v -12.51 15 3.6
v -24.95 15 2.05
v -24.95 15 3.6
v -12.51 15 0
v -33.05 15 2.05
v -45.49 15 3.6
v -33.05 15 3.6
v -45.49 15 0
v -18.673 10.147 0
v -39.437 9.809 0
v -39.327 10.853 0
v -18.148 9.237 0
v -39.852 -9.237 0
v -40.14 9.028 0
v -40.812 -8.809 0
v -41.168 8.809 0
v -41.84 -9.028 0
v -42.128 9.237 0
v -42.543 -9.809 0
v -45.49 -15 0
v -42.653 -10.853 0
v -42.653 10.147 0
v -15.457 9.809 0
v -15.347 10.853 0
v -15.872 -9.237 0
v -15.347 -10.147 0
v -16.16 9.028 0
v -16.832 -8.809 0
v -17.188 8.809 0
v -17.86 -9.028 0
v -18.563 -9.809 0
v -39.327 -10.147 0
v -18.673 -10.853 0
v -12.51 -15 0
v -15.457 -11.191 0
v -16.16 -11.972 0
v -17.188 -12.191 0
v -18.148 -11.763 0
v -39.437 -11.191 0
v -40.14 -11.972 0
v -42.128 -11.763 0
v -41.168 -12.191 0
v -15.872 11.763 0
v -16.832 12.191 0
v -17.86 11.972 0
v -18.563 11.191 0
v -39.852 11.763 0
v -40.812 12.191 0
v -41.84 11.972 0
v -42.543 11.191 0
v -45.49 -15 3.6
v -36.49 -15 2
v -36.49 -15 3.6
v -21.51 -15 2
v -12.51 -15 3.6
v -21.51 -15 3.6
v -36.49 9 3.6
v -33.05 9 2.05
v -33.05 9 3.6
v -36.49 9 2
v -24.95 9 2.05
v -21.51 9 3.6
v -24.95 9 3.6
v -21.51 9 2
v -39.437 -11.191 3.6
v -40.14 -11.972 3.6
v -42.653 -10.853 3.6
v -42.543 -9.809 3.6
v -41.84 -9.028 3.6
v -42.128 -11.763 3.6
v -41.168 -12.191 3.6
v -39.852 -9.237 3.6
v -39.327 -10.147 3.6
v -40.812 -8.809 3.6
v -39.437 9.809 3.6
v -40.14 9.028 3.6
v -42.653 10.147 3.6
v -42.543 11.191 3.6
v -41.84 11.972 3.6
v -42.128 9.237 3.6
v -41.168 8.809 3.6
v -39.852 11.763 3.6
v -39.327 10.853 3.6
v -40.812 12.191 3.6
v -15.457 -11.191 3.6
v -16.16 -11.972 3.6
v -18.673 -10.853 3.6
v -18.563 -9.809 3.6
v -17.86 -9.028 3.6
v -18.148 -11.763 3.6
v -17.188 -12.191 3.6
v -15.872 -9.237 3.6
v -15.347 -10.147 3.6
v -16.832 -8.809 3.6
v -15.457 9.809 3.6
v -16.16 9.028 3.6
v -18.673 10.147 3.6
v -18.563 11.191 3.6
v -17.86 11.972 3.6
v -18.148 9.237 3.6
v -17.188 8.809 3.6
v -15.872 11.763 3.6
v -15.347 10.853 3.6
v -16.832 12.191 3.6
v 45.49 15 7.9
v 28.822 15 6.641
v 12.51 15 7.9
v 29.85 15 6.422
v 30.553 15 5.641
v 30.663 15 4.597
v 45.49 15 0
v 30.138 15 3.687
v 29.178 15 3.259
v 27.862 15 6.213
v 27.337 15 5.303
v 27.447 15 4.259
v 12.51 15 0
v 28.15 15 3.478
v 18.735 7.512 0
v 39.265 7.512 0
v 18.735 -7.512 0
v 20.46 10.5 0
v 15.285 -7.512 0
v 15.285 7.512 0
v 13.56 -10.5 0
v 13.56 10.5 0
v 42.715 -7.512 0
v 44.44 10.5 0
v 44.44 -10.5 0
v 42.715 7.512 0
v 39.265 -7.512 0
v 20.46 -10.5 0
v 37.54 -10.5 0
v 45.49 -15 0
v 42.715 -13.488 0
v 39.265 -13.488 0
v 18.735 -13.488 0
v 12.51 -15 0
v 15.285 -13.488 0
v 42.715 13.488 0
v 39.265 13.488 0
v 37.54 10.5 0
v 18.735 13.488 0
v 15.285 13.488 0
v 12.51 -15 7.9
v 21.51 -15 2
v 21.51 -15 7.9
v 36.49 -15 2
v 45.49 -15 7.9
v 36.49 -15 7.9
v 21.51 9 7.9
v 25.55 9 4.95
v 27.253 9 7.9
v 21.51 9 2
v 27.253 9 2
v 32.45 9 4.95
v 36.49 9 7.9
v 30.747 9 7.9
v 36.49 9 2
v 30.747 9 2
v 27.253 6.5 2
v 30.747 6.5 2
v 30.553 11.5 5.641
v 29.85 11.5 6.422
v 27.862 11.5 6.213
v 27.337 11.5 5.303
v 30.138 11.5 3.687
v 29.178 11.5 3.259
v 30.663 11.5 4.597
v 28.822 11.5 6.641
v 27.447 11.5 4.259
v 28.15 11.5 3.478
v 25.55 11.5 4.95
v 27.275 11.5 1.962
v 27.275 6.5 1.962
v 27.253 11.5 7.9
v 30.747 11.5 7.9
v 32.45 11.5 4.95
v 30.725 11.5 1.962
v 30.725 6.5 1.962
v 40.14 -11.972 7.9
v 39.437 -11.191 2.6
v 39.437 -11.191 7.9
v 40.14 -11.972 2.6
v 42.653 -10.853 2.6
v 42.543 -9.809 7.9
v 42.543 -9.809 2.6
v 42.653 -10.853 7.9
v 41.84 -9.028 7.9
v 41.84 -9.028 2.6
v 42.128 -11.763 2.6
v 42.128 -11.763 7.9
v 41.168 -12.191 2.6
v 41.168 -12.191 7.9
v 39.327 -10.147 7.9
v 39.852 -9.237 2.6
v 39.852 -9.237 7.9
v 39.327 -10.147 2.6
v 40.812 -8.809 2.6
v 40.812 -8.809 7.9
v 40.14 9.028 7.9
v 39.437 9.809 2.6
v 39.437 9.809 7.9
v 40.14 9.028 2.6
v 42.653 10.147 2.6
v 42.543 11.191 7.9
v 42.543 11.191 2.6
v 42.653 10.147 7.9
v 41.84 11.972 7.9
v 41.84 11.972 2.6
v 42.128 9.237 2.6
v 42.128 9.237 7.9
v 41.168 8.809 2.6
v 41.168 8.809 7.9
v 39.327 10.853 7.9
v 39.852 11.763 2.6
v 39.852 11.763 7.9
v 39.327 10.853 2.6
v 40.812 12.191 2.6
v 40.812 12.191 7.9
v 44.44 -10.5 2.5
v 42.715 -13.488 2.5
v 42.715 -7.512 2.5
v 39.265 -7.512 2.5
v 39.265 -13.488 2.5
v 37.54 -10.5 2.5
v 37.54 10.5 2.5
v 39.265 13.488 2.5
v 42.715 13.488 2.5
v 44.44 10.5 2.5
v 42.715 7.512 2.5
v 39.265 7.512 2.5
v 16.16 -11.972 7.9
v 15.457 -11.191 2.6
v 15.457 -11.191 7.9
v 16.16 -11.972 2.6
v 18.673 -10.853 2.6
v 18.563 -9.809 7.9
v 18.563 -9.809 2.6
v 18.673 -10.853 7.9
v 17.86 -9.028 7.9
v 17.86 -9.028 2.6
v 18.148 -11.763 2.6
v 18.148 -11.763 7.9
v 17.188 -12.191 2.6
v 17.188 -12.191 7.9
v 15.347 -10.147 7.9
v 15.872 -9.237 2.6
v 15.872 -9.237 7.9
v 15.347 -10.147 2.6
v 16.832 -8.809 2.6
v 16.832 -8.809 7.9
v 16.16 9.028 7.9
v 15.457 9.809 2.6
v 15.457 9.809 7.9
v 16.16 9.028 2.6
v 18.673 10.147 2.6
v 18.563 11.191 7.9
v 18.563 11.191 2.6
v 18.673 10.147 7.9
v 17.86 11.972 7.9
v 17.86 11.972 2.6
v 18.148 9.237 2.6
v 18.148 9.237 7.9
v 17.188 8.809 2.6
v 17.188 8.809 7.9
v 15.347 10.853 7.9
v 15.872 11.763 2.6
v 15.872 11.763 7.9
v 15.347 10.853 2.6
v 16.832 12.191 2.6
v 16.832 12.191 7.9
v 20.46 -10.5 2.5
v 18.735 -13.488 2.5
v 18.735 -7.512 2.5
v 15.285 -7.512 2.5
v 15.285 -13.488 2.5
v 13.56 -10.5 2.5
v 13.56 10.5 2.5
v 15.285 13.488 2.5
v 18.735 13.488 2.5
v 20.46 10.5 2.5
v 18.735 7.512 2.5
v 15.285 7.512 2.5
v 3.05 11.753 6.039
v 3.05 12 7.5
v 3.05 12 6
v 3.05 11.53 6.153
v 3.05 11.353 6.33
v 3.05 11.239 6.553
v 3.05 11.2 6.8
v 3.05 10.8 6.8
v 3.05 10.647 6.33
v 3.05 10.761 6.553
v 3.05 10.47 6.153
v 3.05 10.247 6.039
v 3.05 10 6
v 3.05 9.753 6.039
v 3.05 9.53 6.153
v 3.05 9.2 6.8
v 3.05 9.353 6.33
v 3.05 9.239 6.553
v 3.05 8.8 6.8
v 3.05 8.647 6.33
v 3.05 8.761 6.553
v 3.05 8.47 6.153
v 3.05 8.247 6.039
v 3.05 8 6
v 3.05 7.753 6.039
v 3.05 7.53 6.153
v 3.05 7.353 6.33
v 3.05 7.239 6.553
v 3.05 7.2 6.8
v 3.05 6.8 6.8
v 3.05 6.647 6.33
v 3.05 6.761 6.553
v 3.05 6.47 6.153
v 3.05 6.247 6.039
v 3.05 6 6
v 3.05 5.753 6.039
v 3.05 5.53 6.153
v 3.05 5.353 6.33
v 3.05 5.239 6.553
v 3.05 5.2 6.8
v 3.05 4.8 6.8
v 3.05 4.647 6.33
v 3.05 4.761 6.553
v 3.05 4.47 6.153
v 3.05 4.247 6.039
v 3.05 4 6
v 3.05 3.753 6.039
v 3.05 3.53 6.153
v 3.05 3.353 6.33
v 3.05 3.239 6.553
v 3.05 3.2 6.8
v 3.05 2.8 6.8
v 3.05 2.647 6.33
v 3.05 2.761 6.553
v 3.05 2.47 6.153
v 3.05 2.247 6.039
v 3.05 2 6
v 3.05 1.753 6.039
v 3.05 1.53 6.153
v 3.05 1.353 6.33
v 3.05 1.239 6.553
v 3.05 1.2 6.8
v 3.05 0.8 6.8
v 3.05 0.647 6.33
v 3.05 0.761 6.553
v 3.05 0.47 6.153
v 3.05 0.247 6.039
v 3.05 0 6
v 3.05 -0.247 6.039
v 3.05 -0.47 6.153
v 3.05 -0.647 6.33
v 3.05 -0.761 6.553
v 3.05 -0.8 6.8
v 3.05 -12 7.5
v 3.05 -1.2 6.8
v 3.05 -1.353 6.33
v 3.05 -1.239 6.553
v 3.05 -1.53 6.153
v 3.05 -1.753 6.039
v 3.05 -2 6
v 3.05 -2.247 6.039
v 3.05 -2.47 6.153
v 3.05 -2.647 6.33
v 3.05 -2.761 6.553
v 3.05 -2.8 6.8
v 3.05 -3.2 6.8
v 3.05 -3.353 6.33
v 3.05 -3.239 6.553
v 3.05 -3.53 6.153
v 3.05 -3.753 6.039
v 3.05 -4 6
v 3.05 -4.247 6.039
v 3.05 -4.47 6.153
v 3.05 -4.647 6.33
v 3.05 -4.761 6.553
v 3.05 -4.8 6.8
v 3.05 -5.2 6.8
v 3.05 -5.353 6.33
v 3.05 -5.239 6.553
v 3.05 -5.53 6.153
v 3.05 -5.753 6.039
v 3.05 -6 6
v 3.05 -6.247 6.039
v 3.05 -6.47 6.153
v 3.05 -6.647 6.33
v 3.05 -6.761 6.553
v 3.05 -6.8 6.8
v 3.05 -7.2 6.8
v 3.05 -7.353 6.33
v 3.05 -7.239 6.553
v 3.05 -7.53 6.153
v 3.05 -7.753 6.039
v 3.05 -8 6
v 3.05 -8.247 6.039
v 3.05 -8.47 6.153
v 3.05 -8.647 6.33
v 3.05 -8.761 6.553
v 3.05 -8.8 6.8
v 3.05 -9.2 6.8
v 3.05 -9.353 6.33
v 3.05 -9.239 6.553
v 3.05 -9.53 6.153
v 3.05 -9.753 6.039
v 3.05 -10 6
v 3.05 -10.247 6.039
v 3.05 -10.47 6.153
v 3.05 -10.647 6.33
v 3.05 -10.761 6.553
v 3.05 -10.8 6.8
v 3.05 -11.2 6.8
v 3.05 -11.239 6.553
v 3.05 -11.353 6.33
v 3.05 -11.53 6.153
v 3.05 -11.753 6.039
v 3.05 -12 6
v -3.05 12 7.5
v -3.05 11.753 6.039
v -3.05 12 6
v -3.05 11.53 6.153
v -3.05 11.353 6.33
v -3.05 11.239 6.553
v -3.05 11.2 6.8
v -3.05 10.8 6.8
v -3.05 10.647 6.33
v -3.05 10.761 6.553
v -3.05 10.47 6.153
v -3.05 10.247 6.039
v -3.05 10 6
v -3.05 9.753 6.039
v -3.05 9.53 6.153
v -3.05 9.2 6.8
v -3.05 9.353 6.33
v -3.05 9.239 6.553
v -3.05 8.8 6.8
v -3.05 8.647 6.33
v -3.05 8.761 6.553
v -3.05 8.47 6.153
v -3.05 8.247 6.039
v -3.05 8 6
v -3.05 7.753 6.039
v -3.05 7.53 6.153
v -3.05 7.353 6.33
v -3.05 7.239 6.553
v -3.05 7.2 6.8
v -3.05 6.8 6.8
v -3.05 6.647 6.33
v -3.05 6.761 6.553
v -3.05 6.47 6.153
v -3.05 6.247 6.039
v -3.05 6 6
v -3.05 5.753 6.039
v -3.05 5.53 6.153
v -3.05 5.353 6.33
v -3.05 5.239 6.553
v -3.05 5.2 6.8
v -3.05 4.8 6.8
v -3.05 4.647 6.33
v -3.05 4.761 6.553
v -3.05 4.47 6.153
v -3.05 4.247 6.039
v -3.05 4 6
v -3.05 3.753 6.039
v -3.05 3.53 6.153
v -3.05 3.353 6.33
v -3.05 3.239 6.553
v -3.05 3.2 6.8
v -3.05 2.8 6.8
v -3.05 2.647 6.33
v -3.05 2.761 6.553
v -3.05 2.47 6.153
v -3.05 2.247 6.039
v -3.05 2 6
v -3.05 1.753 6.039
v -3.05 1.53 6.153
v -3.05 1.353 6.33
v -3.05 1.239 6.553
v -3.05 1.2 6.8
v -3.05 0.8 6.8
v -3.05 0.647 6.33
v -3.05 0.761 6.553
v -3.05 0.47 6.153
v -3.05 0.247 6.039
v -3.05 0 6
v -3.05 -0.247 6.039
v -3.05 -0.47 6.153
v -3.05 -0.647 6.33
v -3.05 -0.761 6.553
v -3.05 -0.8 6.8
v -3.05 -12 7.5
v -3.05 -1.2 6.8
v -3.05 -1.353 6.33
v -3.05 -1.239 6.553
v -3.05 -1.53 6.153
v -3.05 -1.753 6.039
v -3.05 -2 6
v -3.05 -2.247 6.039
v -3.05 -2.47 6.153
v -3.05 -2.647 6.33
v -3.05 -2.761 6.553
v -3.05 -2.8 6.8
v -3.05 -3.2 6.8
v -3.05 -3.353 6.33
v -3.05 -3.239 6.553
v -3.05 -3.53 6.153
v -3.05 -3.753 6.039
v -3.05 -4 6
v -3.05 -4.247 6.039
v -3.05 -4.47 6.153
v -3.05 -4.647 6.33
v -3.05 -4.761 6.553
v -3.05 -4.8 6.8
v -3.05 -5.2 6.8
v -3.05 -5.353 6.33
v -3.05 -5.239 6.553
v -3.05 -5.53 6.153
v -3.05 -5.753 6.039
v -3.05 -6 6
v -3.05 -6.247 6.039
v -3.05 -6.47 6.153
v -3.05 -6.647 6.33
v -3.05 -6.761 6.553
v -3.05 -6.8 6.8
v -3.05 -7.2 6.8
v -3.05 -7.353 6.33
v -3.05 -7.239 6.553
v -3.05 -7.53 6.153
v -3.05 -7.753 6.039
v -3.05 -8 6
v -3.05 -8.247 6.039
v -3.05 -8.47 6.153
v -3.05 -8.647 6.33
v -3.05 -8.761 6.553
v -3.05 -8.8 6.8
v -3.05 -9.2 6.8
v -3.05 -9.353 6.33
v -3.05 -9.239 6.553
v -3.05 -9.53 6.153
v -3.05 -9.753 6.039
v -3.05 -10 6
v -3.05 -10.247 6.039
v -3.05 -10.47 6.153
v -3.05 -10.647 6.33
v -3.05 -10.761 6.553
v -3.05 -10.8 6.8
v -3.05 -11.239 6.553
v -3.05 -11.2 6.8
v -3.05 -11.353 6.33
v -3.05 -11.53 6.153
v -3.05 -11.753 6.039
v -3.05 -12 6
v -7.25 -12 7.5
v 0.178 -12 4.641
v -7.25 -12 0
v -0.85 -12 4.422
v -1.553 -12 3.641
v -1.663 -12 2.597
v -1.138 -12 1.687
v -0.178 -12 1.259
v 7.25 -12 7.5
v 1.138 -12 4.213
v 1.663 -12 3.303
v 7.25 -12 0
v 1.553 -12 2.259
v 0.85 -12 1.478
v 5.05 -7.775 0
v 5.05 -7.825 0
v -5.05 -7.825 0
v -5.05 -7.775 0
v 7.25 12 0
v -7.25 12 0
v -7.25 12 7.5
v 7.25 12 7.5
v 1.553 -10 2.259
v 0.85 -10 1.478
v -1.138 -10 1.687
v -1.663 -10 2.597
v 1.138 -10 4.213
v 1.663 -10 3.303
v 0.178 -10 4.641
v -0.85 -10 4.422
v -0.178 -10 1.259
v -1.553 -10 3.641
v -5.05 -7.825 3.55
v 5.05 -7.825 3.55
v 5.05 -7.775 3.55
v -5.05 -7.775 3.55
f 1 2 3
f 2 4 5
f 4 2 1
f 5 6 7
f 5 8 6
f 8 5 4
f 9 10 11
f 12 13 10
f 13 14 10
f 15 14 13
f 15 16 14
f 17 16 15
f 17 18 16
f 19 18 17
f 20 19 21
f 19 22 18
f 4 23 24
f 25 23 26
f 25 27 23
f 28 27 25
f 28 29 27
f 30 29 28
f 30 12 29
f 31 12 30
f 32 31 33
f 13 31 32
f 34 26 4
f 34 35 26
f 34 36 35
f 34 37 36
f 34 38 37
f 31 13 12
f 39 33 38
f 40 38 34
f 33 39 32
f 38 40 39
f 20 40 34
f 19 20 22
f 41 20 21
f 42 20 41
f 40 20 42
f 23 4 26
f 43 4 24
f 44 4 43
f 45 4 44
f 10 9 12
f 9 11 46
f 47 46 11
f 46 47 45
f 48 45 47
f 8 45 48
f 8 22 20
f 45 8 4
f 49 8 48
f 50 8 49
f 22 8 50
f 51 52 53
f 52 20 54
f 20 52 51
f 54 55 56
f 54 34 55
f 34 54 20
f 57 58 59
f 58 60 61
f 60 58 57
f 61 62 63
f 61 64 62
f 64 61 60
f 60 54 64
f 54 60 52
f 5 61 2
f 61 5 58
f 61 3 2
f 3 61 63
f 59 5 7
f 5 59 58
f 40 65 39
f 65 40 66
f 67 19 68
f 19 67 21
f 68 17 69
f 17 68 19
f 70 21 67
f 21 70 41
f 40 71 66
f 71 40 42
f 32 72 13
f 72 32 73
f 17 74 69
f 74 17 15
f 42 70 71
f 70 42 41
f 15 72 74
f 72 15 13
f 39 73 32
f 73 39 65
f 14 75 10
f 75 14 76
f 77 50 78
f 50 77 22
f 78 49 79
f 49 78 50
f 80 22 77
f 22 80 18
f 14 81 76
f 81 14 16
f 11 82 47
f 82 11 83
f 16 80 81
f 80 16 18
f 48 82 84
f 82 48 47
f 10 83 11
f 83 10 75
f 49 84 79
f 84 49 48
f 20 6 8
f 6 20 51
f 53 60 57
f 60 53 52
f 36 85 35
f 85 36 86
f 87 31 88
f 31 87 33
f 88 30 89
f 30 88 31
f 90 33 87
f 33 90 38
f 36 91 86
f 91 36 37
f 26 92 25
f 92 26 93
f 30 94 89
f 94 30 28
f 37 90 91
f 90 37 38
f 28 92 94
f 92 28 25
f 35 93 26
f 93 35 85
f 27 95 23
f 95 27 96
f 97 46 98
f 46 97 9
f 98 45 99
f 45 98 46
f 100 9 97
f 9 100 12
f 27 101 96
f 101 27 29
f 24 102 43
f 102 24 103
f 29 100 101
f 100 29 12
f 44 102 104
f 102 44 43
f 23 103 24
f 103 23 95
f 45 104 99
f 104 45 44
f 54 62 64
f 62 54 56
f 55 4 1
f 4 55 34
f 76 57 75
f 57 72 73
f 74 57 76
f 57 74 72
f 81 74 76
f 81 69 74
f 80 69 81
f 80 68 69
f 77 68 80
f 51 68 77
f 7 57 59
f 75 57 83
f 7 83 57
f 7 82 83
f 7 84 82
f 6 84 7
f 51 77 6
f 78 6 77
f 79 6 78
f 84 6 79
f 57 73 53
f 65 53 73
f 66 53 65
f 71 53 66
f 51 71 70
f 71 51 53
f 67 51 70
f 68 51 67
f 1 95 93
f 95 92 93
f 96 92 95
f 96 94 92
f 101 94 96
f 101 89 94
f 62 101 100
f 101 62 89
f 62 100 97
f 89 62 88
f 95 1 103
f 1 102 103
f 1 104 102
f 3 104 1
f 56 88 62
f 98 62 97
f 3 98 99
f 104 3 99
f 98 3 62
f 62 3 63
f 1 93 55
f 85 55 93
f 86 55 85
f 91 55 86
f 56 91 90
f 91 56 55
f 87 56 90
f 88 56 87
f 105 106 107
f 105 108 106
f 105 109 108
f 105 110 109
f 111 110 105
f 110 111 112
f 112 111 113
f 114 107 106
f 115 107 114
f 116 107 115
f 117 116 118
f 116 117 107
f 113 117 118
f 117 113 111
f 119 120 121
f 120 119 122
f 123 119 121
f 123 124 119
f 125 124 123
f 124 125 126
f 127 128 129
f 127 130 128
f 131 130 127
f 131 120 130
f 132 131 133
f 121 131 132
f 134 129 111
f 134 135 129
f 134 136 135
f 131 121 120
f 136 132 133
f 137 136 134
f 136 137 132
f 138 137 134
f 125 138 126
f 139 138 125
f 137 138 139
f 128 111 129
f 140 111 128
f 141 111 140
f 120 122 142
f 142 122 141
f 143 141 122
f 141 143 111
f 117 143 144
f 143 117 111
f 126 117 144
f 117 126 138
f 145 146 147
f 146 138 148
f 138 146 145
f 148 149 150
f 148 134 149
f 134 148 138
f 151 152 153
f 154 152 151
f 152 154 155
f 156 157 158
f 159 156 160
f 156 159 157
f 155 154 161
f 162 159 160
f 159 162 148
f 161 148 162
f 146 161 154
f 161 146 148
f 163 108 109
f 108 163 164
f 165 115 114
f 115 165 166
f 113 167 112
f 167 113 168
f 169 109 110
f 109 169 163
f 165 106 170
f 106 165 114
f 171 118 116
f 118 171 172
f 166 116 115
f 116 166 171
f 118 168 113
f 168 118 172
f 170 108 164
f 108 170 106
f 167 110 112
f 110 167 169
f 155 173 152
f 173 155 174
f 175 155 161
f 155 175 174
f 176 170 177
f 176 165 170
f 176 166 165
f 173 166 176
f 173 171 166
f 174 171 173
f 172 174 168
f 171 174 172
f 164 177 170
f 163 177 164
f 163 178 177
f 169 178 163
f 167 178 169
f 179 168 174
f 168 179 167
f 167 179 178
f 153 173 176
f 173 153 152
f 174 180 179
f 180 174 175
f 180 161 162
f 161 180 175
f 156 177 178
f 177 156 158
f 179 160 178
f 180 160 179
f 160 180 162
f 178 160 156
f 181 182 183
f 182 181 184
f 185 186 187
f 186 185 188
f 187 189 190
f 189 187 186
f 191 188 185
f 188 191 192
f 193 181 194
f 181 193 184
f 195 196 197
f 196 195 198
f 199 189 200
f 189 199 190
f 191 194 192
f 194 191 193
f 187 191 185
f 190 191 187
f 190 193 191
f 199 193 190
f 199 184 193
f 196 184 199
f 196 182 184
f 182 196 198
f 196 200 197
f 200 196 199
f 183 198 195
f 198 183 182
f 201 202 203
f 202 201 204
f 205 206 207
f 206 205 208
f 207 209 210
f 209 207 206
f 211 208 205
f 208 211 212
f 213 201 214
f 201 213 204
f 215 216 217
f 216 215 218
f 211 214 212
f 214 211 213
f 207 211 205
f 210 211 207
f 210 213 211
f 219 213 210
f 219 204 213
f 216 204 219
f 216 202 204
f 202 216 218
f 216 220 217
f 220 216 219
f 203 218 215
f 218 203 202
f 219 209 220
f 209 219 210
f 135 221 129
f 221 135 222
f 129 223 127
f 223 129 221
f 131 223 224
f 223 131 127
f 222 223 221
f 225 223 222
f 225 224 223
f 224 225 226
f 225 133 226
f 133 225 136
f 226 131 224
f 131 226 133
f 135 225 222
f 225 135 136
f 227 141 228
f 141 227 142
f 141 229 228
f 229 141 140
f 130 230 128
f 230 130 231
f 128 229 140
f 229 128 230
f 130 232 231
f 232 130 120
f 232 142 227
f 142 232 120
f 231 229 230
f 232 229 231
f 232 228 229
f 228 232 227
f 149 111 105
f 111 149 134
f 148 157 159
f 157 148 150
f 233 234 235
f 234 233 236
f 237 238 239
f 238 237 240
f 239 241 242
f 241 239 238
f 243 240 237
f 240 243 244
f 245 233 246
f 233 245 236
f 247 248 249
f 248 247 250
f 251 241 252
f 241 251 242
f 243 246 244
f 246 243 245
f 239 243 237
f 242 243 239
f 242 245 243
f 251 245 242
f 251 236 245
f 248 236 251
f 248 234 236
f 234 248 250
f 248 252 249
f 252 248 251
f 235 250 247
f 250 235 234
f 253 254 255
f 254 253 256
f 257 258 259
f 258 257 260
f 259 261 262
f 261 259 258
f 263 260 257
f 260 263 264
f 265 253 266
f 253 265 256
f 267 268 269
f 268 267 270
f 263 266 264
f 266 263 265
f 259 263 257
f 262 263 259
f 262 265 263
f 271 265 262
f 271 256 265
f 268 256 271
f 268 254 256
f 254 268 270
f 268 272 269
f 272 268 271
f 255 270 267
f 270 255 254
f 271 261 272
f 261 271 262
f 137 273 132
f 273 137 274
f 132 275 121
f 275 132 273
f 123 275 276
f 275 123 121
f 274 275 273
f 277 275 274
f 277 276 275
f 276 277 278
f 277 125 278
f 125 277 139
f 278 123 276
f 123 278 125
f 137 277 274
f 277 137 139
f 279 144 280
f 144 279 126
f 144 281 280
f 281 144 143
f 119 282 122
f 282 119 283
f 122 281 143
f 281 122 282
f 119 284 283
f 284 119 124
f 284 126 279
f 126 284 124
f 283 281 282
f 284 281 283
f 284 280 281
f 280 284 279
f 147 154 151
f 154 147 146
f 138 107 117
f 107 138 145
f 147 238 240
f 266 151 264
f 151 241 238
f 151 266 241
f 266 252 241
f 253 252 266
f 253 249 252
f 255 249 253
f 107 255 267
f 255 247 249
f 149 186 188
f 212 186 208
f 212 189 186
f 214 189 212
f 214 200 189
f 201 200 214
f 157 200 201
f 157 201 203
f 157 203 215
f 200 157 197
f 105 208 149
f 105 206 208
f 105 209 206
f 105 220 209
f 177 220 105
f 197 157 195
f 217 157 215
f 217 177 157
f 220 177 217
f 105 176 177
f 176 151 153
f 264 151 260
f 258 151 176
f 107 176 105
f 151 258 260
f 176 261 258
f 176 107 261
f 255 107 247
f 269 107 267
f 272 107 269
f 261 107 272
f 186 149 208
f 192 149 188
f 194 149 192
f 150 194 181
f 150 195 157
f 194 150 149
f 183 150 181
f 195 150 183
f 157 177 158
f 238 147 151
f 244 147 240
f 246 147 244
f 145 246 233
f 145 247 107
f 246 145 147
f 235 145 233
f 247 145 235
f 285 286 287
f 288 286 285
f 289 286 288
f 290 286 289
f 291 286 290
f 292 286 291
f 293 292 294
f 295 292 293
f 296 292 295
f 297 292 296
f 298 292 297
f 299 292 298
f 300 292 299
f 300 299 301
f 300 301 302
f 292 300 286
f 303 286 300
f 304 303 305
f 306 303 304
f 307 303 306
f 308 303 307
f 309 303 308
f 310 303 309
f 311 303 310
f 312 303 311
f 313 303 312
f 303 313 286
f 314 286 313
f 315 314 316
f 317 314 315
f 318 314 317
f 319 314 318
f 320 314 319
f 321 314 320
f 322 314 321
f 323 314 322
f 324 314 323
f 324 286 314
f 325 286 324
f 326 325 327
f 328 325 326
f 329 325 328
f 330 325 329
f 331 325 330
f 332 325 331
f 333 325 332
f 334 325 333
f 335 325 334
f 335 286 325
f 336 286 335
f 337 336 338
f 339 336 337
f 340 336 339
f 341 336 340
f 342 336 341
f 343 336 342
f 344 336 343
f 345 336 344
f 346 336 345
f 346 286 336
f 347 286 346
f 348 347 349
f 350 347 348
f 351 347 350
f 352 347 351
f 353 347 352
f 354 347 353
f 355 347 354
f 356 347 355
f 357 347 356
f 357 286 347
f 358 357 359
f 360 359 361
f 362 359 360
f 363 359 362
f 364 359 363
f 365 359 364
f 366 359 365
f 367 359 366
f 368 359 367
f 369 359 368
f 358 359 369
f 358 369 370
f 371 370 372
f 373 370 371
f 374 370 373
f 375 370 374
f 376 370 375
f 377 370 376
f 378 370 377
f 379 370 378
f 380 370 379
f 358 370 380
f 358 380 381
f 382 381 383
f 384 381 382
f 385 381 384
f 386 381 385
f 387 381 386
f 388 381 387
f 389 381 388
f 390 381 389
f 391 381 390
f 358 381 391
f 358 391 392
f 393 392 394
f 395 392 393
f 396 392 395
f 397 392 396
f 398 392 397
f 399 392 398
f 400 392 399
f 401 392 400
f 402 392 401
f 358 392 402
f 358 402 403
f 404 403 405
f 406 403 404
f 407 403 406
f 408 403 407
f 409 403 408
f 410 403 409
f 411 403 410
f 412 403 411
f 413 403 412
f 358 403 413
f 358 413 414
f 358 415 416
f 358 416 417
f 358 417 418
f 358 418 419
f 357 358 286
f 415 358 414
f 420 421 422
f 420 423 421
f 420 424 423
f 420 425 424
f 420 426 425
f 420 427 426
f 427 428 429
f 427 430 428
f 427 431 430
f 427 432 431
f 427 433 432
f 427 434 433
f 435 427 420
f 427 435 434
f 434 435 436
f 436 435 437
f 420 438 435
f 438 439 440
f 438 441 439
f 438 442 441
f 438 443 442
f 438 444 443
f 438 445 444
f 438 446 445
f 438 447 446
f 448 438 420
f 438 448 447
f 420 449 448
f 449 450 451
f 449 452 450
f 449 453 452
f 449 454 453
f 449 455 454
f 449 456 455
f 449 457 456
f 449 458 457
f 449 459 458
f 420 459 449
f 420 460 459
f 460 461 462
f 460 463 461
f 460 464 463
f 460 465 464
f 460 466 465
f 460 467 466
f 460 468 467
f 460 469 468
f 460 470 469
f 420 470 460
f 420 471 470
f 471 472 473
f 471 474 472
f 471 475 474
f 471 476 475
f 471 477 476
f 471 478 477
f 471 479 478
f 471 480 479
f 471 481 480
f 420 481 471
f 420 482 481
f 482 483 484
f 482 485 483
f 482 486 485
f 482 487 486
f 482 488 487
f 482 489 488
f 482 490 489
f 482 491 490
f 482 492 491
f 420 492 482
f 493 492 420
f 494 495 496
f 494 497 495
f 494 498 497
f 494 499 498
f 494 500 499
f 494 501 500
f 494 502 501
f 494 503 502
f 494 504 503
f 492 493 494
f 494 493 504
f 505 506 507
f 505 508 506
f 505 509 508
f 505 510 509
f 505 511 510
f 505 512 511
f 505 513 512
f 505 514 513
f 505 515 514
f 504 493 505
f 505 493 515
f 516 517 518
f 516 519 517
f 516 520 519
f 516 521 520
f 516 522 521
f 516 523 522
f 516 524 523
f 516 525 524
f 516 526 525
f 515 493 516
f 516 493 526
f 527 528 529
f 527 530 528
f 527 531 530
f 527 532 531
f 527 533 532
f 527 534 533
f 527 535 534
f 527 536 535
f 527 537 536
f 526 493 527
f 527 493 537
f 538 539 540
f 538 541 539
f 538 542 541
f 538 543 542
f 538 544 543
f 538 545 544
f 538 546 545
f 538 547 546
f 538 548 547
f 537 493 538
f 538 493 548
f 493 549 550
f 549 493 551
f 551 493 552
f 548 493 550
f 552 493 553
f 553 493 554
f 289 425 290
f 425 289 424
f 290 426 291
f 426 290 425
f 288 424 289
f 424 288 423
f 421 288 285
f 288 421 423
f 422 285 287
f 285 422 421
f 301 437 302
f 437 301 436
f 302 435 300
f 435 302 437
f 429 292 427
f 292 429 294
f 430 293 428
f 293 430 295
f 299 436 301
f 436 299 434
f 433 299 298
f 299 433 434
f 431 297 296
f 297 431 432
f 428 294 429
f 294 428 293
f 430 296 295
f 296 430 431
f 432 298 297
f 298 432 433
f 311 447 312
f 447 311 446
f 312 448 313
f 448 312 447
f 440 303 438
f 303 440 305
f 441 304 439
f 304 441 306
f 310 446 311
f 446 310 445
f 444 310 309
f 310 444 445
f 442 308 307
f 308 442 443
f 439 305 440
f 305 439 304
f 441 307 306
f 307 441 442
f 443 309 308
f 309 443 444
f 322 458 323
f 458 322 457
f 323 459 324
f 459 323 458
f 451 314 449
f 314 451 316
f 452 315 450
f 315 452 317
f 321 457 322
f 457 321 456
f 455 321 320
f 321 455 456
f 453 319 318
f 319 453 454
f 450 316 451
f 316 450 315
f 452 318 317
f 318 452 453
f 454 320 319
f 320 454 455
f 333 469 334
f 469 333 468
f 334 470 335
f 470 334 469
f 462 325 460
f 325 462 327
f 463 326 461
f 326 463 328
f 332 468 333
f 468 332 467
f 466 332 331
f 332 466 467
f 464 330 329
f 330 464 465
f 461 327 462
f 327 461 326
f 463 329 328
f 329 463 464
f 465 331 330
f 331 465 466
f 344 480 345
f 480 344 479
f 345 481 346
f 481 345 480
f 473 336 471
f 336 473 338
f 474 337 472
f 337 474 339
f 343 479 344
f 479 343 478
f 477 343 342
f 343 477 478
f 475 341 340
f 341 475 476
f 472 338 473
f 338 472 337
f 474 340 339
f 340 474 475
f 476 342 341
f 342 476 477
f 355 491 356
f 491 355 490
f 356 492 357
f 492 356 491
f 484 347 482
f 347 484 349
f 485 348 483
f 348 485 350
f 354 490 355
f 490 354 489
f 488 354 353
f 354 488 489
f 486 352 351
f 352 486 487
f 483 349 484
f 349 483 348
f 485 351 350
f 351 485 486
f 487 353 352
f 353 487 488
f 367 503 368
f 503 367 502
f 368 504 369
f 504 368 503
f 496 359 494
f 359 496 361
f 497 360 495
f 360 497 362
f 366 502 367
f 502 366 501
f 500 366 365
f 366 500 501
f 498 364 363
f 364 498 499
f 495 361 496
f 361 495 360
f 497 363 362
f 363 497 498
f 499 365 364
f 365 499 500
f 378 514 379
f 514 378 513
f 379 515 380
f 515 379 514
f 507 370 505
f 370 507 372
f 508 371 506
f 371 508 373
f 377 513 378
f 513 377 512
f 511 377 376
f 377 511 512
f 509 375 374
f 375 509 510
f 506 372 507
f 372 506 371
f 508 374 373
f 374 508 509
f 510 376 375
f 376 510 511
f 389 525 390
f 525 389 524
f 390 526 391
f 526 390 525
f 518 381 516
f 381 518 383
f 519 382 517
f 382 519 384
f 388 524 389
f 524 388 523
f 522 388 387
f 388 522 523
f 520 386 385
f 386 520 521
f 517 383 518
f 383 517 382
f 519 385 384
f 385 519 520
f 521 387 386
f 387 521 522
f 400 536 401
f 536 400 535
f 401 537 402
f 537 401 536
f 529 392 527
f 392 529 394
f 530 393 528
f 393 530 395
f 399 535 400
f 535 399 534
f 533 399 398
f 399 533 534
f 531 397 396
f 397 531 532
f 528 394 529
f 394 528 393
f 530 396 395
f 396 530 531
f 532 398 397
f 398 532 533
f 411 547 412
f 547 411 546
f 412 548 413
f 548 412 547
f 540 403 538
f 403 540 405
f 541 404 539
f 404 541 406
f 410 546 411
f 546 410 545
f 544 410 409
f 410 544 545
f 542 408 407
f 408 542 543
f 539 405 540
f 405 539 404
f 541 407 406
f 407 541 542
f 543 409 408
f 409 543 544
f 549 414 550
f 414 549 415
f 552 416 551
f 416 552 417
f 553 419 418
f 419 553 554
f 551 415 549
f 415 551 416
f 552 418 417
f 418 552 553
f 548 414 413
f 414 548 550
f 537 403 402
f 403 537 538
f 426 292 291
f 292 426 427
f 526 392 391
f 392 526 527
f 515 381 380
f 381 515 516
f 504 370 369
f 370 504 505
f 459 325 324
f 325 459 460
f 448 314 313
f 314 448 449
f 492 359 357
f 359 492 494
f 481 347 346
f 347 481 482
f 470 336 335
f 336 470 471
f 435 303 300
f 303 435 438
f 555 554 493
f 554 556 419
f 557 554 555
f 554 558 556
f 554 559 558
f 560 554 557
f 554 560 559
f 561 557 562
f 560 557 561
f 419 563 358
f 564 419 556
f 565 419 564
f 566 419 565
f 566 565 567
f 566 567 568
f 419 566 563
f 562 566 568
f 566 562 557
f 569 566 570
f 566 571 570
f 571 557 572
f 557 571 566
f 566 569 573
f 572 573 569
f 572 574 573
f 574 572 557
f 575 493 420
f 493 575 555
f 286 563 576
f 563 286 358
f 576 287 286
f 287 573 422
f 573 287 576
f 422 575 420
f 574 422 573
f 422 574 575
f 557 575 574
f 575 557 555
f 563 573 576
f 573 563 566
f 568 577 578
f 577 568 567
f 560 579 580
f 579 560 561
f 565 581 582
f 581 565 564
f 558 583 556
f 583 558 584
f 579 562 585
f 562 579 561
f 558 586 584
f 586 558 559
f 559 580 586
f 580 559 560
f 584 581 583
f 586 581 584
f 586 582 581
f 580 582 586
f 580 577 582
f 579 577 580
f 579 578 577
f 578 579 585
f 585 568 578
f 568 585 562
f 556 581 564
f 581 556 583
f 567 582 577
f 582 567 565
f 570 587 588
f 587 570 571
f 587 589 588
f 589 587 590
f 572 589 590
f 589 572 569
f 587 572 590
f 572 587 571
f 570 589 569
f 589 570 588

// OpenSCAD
// Y-belt retainer/tensioner
// May 2012 John Newman
// June 2012 Luis Andrade

// This parameter deterimes how far the belt is held above the deck
dRise = 0;				// Added to the depth to make the belt run horizontal

// Belt dimensions - These are for T5
//tBase = 1.5;			// Thickness of belt base
//tFull = 2.7;			// Thickness of Belt at teeth
//wTooth = 2.6;			// Width of tooth (not actual, req)
//wSpace = 2.4;			// Width of space

// Belt dimensions - These are for T2.5
//tBase = 1.25;			// Thickness of belt base
//tFull = 2.0;			// Thickness of Belt at teeth
//wTooth = 1.4;			// Width of tooth (not actual, req)
//wSpace = 1.1;			// Width of space

// Belt dimensions - These are for GT2 2mm
tFull = 1.6;			// Thickness of Belt at teeth
tTooth = 0.8;			// Thickness of Belt teeth
tBase = tFull - tTooth;	// Thickness of belt base
wTooth = 2.0;			// GT Belt pitch
wSpace = 0.0;			// Width of space (not used in GT2)

// Defines the belt to be used
// 0 = T5
// 1 = T2.5
// 2 = GT2
belt = 2;
wBelt = 6.1;				// Width of belt

// Misc params
wHex = 6.9;				// Width of trap for hex nut
dHex = 2.5;				// Depth of trap for hex nut
rM3 = 1.7;				// Radius of M3 bolt hole
sDrop = wHex/2-0.5; 	// Driver screw drop from base of slider
Adjust = 0.5;			// Spacing for things to fit inside other things!
pWidth = 9;				// Screw platform width

// Base parameters
bwExt = 15;				// Widest part of base
bwInt = 15;				// inside width, where slider goes
blExt = 30;				// Overall length of base
blHed = 6;				// Head of base whch takes the strain !
bdExt = 12;			// This included a minimum floor thickness of 2mm (?)
bRoof = 2;			// The thickness of the roof which holds the slider in
bFloor = 2;				// The thickness of the floor under the slider (minimum)
bdSoc = bdExt-(bRoof+bFloor);		// 'Socket' depth for slider to go in

// Slider parameters
swMax = bwInt - Adjust;		// Wide part of slider
sdMax = bdSoc-Adjust;		// Height of slider

lBelt = blExt*2;			// Length of a bit of belt!
rMsk = blExt/3 ;			// Radius of part of mount masking...
resol = 10;				// Resolution of the holes

//=====================================================

rotate([0,0,90]) {
	// Bottom part
	difference() {
		translate([0, bwExt+pWidth+5, bdExt/2+dRise]) 
		rotate([0, 180, 180])
		basepart();

		translate([0,bwExt+pWidth+5, 10+dRise-(2-tFull)])
		cube([blExt+10, bwExt+pWidth+12, bdExt], center = true);
	}

	// Upper part
	difference() {
		translate([0, -1*(bwExt+pWidth+5), bdExt/2]) 
		basepart();

		translate([0,-1*(bwExt+pWidth+5), bdExt+1.9])
		cube([blExt+10, bwExt+pWidth+12, bdExt], center = true);
	}

	// One piece vertical
	//translate([0, 20, blExt/2])
	//rotate([0, 90, 90])
	//basepart();

	// Slider
	translate([0,0,(sdMax)/2]) 
	rotate([0,180,0]) 
	sliderpart();
}

//=====================================================

module sliderpart() {
	difference() {
		cube([blExt-blHed,swMax,sdMax],center=true);

		// Make a hole for the bolt end
		translate([(blExt-blHed)/2-2,0,(sdMax/2)-sDrop]) 
		rotate([30,0,0]) 
		rotate([0,90,0]) 
		cylinder(h = 10, r = rM3, $fn=resol);

		// Make a fracture to cause fill
		translate([(blExt-blHed)/2-4.2,0,(sdMax-tFull)/2+1]) 
		cube([0.05,swMax-4.4,sdMax],center=true) ;

		// Finally indent for belt
		translate([-lBelt/2,-wBelt/2,-sdMax/2-0.1]) 
		if (belt == 2)
			belt_gt2();
		else
			belt();
	}
}

//=====================================================

module basepart() {
	union() {
		difference() {
			translate([0,0,dRise/2]) 
			cube([blExt,bwExt,bdExt+dRise],center=true);

			// Remove the space for the slider
			translate([-blHed,0,(bFloor-bRoof)/2]) 
			cube([blExt,bwInt,bdSoc],center=true);

			// Remove a hole for the bolt
			translate([(blExt/2-(blExt+blHed-1)),0,bFloor+sDrop-bdExt/2]) 
			rotate([30,0,0]) 
			rotate([0,90,0]) 
			cylinder(h = blExt+blHed,r = rM3, $fn=resol);

			// An indentation for the bolt head
			translate([(blExt/2)-(blHed+5-dHex),0,bFloor+sDrop-bdExt/2]) 
			rotate([30,0,0]) 
			rotate([0,90,0]) 
			cylinder(5,wHex/2,wHex/2,$fn=6);

			// A slot for the belt to come through
			translate([blExt/2,0,(bdExt-tFull)/2-bRoof-0.1]) 
			cube([blExt+blHed,wBelt+2,tFull+0.1],center=true);
		}

		for (i = [-1:1])
		if (i != 0) {
			translate([0,i*(bwExt/2 + (pWidth/2-0.01)),(bdExt/2-bdExt/2)+dRise/2]) 
			rotate([180,0,0])
			screwmount() ;
		}
	}
}

//=====================================================

module belt_gt2() {
	cube([lBelt,wBelt,tBase]) ;
	for (inc = [0:wTooth:lBelt-wTooth]) 
		translate([inc,wBelt,tBase]) 
		rotate([90,0,0])
		cylinder(h = wBelt, r=tTooth, $fn=20);
}

//=====================================================

module belt() {
	cube([lBelt,wBelt,tBase]) ;
	for (inc = [0:(wTooth+wSpace):lBelt-wTooth]) 
		translate([inc,0,tBase-0.01]) 
		cube([wTooth,wBelt,(tFull-tBase)]) ;
}

//=====================================================

module screwmount() {
	difference() {
		cube([blExt,pWidth,bdExt+dRise],center=true);

		// Bolt holes (not passthrought to generate bridge)
		for (i = [-1:1]) {
			if (i != 0)
			translate([i*(blExt-pWidth)/2,0,-(bdExt/2+dRise/2)-0.1]) 
			rotate([0,0,30]) 
			cylinder(h = bdExt+dRise-dHex, r = rM3,$fn=resol);
		}

		// Nut traps
		for (i = [-1:1]) {
			if (i != 0)
			translate([i*((blExt-pWidth)/2), 0, (bdExt/2-dHex)+dRise/2]) 
			rotate([0,0,30]) 
			cylinder(h=dHex+0.1, r=wHex/2,$fn=6);
		}
	}
}
